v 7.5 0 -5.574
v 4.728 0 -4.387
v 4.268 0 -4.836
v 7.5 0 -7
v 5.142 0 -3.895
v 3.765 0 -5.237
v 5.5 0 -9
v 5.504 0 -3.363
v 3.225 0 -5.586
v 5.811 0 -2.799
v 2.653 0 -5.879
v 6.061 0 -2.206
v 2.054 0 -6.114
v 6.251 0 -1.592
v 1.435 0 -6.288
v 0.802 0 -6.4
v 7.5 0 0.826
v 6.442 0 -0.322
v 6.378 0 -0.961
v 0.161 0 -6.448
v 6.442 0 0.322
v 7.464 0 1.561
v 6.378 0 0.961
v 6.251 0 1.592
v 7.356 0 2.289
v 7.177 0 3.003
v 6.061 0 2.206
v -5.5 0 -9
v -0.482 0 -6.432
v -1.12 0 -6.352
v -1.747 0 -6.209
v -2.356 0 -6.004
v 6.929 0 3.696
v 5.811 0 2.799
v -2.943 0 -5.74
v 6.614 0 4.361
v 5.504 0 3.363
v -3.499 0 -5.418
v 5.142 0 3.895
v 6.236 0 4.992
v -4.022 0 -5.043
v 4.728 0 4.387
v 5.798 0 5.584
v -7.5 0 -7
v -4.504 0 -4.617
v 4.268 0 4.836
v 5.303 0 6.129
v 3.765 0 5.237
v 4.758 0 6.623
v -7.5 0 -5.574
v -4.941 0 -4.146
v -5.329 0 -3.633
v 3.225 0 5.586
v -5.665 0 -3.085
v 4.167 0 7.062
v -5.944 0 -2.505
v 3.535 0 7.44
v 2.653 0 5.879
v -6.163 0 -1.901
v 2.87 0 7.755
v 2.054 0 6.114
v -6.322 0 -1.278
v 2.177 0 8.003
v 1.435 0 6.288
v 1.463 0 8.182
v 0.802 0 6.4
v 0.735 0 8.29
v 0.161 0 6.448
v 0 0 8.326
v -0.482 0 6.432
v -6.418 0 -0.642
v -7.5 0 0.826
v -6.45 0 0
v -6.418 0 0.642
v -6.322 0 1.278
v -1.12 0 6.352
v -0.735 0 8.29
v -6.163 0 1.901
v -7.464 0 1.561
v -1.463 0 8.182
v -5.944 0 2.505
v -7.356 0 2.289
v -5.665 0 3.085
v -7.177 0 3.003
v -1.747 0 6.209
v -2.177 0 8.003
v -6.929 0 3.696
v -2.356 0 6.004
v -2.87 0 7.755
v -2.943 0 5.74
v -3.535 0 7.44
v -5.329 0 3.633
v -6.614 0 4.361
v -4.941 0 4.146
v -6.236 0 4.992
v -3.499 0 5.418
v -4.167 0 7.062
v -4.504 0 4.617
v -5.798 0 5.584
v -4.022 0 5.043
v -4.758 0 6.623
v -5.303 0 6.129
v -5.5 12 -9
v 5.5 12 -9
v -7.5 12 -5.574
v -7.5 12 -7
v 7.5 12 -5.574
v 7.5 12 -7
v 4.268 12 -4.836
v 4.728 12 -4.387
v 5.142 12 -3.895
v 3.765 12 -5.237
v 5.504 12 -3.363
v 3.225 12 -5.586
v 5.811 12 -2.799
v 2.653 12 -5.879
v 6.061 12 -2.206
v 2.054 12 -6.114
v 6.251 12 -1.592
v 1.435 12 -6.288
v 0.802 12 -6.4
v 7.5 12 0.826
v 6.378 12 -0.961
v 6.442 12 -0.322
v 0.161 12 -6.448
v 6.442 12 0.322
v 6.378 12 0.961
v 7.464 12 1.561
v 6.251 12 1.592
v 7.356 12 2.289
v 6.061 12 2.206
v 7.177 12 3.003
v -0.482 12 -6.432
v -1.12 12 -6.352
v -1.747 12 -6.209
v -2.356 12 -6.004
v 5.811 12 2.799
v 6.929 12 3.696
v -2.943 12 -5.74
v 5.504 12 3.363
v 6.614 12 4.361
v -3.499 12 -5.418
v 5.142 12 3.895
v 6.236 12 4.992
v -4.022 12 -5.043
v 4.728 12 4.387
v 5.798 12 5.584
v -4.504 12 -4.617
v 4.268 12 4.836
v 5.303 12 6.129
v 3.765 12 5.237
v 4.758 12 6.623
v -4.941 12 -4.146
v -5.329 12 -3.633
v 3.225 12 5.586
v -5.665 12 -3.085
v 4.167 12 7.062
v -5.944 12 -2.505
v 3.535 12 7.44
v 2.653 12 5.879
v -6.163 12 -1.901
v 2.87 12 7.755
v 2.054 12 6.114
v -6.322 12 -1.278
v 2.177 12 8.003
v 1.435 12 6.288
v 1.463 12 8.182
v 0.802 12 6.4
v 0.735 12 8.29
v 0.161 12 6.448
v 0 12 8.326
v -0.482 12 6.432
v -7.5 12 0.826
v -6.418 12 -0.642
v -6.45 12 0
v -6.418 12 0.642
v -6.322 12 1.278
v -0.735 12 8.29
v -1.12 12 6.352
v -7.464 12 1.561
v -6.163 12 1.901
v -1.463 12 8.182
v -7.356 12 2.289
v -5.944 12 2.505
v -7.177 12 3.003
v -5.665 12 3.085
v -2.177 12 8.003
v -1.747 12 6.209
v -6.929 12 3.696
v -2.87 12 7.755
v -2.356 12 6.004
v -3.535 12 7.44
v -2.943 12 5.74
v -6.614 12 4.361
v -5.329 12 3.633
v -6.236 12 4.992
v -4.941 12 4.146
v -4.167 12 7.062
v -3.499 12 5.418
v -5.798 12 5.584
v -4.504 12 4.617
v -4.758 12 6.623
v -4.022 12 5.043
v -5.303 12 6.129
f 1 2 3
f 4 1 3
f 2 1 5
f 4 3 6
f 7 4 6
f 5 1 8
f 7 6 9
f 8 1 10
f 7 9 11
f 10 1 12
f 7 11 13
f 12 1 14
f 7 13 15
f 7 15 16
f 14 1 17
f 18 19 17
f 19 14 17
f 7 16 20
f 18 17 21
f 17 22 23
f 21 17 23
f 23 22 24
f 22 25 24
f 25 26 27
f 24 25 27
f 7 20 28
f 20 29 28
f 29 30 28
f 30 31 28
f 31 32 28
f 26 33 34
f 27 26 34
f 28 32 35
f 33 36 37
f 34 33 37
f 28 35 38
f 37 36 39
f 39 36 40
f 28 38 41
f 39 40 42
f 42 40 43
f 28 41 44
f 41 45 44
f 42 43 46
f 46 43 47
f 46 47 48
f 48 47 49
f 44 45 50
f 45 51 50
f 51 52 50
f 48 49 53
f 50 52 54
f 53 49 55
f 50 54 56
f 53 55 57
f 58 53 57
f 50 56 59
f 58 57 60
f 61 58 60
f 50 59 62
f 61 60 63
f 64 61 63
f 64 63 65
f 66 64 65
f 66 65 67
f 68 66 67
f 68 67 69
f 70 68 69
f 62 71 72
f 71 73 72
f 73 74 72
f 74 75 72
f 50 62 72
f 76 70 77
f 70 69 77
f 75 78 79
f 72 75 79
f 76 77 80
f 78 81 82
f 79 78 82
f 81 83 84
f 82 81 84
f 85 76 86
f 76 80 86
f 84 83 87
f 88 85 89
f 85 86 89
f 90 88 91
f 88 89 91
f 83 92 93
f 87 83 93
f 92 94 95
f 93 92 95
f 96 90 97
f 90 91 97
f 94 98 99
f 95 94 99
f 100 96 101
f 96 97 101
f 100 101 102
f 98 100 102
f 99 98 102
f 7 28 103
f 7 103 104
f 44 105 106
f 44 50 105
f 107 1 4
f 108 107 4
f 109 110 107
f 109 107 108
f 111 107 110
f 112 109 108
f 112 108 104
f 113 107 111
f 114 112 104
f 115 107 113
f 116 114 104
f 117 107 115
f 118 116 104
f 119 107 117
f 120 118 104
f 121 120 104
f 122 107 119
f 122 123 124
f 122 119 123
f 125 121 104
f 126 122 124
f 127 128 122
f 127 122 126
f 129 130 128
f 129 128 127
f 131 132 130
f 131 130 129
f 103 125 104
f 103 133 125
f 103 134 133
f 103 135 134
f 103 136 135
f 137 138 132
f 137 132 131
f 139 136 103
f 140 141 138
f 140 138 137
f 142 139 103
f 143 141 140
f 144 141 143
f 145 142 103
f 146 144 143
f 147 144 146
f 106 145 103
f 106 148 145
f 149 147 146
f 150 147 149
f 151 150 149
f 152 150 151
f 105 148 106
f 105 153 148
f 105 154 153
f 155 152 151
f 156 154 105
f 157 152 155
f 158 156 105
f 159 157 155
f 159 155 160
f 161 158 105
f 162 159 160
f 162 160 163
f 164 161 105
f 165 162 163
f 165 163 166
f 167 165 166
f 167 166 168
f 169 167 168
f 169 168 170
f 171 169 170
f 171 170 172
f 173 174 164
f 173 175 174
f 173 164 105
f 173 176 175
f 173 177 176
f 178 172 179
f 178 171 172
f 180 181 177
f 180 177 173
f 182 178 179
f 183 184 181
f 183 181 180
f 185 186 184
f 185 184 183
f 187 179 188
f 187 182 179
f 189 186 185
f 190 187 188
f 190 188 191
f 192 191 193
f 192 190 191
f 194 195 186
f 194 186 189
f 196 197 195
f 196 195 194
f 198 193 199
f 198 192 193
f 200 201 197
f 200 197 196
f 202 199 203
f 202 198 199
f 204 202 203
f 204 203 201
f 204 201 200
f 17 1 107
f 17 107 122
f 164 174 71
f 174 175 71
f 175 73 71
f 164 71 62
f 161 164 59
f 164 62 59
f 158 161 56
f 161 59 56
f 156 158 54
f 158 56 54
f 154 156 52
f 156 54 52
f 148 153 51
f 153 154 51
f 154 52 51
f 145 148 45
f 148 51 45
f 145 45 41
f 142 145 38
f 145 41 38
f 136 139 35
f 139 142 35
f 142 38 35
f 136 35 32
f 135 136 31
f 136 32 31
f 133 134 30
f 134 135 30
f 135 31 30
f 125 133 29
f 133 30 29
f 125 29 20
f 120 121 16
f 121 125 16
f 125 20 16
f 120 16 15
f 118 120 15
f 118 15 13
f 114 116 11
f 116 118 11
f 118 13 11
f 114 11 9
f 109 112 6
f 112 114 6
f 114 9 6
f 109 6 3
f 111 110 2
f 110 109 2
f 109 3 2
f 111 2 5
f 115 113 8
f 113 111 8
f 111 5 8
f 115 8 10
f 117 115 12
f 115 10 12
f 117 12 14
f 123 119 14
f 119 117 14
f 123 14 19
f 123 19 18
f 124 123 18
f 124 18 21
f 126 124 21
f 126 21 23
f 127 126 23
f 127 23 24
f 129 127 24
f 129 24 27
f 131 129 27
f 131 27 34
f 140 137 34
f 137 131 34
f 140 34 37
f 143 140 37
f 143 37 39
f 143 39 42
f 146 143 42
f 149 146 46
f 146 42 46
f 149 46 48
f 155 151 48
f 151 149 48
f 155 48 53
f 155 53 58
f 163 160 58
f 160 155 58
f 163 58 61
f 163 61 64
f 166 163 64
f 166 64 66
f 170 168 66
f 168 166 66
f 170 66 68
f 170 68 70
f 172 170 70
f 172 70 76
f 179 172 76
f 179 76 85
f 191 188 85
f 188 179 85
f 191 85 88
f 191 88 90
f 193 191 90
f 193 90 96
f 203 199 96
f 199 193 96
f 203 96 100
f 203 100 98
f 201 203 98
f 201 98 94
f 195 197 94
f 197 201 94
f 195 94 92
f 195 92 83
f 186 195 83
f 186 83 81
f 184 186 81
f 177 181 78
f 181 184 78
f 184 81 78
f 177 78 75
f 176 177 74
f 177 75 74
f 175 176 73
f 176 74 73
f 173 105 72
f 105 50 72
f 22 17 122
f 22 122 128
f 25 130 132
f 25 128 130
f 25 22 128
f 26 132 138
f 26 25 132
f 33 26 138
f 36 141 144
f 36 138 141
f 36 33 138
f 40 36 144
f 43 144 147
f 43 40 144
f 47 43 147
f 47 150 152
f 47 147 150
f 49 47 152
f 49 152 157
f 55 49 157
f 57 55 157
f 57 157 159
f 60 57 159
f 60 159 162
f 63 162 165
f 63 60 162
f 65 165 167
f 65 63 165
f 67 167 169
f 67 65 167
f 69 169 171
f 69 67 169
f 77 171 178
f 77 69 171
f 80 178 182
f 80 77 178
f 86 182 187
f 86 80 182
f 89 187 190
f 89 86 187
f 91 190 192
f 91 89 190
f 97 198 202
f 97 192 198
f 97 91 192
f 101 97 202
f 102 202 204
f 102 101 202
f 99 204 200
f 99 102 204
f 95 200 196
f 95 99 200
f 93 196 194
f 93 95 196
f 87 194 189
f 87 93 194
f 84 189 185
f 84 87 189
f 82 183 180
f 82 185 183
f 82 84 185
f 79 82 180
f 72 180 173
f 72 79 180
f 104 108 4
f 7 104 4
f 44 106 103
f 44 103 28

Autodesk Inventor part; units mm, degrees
ref_plane "YZ Plane" through (0, 0, 0) normal (1, 0, 0) x (0, 1, 0)
ref_plane "XZ Plane" through (0, 0, 0) normal (0, 1, 0) x (-1, 0, 0)
ref_plane "XY Plane" through (0, 0, 0) normal (0, 0, 1) x (1, 0, 0)
sketch "Sketch1" plane through (0, 0, 0) normal (0, 1, 0) x (-1, 0, 0)
  circle A0 centre (0, 0) radius 6.45
  arc A1 (7.5, 0.8257) -> (-7.5, 0.8257) centre (0, 0.8257) ccw
  line L0 (-7.5, -5.5743) -> (-7.5, 0.8257)
  line L1 (7.5, -5.5743) -> (7.5, 0.8257)
  line L2 (7.5, -5.5743) -> (7.5, -9)
  line L3 (-7.5, -5.5743) -> (-7.5, -9)
  line L4 (7.5, -9) -> (-7.5, -9)
  dimension "d0" = 12.9
  dimension "d2" = 7.5
  dimension "d7" = 9
extrude "Extrusion1" add sketch "Sketch1" along normal blind 12
chamfer "Chamfer1" distance 2 angle 45 1 edges at (7.5, 6, -9)
chamfer "Chamfer2" distance 2 angle 45 1 edges at (-7.5, 6, -9)
properties part number "x bushing holder full"
